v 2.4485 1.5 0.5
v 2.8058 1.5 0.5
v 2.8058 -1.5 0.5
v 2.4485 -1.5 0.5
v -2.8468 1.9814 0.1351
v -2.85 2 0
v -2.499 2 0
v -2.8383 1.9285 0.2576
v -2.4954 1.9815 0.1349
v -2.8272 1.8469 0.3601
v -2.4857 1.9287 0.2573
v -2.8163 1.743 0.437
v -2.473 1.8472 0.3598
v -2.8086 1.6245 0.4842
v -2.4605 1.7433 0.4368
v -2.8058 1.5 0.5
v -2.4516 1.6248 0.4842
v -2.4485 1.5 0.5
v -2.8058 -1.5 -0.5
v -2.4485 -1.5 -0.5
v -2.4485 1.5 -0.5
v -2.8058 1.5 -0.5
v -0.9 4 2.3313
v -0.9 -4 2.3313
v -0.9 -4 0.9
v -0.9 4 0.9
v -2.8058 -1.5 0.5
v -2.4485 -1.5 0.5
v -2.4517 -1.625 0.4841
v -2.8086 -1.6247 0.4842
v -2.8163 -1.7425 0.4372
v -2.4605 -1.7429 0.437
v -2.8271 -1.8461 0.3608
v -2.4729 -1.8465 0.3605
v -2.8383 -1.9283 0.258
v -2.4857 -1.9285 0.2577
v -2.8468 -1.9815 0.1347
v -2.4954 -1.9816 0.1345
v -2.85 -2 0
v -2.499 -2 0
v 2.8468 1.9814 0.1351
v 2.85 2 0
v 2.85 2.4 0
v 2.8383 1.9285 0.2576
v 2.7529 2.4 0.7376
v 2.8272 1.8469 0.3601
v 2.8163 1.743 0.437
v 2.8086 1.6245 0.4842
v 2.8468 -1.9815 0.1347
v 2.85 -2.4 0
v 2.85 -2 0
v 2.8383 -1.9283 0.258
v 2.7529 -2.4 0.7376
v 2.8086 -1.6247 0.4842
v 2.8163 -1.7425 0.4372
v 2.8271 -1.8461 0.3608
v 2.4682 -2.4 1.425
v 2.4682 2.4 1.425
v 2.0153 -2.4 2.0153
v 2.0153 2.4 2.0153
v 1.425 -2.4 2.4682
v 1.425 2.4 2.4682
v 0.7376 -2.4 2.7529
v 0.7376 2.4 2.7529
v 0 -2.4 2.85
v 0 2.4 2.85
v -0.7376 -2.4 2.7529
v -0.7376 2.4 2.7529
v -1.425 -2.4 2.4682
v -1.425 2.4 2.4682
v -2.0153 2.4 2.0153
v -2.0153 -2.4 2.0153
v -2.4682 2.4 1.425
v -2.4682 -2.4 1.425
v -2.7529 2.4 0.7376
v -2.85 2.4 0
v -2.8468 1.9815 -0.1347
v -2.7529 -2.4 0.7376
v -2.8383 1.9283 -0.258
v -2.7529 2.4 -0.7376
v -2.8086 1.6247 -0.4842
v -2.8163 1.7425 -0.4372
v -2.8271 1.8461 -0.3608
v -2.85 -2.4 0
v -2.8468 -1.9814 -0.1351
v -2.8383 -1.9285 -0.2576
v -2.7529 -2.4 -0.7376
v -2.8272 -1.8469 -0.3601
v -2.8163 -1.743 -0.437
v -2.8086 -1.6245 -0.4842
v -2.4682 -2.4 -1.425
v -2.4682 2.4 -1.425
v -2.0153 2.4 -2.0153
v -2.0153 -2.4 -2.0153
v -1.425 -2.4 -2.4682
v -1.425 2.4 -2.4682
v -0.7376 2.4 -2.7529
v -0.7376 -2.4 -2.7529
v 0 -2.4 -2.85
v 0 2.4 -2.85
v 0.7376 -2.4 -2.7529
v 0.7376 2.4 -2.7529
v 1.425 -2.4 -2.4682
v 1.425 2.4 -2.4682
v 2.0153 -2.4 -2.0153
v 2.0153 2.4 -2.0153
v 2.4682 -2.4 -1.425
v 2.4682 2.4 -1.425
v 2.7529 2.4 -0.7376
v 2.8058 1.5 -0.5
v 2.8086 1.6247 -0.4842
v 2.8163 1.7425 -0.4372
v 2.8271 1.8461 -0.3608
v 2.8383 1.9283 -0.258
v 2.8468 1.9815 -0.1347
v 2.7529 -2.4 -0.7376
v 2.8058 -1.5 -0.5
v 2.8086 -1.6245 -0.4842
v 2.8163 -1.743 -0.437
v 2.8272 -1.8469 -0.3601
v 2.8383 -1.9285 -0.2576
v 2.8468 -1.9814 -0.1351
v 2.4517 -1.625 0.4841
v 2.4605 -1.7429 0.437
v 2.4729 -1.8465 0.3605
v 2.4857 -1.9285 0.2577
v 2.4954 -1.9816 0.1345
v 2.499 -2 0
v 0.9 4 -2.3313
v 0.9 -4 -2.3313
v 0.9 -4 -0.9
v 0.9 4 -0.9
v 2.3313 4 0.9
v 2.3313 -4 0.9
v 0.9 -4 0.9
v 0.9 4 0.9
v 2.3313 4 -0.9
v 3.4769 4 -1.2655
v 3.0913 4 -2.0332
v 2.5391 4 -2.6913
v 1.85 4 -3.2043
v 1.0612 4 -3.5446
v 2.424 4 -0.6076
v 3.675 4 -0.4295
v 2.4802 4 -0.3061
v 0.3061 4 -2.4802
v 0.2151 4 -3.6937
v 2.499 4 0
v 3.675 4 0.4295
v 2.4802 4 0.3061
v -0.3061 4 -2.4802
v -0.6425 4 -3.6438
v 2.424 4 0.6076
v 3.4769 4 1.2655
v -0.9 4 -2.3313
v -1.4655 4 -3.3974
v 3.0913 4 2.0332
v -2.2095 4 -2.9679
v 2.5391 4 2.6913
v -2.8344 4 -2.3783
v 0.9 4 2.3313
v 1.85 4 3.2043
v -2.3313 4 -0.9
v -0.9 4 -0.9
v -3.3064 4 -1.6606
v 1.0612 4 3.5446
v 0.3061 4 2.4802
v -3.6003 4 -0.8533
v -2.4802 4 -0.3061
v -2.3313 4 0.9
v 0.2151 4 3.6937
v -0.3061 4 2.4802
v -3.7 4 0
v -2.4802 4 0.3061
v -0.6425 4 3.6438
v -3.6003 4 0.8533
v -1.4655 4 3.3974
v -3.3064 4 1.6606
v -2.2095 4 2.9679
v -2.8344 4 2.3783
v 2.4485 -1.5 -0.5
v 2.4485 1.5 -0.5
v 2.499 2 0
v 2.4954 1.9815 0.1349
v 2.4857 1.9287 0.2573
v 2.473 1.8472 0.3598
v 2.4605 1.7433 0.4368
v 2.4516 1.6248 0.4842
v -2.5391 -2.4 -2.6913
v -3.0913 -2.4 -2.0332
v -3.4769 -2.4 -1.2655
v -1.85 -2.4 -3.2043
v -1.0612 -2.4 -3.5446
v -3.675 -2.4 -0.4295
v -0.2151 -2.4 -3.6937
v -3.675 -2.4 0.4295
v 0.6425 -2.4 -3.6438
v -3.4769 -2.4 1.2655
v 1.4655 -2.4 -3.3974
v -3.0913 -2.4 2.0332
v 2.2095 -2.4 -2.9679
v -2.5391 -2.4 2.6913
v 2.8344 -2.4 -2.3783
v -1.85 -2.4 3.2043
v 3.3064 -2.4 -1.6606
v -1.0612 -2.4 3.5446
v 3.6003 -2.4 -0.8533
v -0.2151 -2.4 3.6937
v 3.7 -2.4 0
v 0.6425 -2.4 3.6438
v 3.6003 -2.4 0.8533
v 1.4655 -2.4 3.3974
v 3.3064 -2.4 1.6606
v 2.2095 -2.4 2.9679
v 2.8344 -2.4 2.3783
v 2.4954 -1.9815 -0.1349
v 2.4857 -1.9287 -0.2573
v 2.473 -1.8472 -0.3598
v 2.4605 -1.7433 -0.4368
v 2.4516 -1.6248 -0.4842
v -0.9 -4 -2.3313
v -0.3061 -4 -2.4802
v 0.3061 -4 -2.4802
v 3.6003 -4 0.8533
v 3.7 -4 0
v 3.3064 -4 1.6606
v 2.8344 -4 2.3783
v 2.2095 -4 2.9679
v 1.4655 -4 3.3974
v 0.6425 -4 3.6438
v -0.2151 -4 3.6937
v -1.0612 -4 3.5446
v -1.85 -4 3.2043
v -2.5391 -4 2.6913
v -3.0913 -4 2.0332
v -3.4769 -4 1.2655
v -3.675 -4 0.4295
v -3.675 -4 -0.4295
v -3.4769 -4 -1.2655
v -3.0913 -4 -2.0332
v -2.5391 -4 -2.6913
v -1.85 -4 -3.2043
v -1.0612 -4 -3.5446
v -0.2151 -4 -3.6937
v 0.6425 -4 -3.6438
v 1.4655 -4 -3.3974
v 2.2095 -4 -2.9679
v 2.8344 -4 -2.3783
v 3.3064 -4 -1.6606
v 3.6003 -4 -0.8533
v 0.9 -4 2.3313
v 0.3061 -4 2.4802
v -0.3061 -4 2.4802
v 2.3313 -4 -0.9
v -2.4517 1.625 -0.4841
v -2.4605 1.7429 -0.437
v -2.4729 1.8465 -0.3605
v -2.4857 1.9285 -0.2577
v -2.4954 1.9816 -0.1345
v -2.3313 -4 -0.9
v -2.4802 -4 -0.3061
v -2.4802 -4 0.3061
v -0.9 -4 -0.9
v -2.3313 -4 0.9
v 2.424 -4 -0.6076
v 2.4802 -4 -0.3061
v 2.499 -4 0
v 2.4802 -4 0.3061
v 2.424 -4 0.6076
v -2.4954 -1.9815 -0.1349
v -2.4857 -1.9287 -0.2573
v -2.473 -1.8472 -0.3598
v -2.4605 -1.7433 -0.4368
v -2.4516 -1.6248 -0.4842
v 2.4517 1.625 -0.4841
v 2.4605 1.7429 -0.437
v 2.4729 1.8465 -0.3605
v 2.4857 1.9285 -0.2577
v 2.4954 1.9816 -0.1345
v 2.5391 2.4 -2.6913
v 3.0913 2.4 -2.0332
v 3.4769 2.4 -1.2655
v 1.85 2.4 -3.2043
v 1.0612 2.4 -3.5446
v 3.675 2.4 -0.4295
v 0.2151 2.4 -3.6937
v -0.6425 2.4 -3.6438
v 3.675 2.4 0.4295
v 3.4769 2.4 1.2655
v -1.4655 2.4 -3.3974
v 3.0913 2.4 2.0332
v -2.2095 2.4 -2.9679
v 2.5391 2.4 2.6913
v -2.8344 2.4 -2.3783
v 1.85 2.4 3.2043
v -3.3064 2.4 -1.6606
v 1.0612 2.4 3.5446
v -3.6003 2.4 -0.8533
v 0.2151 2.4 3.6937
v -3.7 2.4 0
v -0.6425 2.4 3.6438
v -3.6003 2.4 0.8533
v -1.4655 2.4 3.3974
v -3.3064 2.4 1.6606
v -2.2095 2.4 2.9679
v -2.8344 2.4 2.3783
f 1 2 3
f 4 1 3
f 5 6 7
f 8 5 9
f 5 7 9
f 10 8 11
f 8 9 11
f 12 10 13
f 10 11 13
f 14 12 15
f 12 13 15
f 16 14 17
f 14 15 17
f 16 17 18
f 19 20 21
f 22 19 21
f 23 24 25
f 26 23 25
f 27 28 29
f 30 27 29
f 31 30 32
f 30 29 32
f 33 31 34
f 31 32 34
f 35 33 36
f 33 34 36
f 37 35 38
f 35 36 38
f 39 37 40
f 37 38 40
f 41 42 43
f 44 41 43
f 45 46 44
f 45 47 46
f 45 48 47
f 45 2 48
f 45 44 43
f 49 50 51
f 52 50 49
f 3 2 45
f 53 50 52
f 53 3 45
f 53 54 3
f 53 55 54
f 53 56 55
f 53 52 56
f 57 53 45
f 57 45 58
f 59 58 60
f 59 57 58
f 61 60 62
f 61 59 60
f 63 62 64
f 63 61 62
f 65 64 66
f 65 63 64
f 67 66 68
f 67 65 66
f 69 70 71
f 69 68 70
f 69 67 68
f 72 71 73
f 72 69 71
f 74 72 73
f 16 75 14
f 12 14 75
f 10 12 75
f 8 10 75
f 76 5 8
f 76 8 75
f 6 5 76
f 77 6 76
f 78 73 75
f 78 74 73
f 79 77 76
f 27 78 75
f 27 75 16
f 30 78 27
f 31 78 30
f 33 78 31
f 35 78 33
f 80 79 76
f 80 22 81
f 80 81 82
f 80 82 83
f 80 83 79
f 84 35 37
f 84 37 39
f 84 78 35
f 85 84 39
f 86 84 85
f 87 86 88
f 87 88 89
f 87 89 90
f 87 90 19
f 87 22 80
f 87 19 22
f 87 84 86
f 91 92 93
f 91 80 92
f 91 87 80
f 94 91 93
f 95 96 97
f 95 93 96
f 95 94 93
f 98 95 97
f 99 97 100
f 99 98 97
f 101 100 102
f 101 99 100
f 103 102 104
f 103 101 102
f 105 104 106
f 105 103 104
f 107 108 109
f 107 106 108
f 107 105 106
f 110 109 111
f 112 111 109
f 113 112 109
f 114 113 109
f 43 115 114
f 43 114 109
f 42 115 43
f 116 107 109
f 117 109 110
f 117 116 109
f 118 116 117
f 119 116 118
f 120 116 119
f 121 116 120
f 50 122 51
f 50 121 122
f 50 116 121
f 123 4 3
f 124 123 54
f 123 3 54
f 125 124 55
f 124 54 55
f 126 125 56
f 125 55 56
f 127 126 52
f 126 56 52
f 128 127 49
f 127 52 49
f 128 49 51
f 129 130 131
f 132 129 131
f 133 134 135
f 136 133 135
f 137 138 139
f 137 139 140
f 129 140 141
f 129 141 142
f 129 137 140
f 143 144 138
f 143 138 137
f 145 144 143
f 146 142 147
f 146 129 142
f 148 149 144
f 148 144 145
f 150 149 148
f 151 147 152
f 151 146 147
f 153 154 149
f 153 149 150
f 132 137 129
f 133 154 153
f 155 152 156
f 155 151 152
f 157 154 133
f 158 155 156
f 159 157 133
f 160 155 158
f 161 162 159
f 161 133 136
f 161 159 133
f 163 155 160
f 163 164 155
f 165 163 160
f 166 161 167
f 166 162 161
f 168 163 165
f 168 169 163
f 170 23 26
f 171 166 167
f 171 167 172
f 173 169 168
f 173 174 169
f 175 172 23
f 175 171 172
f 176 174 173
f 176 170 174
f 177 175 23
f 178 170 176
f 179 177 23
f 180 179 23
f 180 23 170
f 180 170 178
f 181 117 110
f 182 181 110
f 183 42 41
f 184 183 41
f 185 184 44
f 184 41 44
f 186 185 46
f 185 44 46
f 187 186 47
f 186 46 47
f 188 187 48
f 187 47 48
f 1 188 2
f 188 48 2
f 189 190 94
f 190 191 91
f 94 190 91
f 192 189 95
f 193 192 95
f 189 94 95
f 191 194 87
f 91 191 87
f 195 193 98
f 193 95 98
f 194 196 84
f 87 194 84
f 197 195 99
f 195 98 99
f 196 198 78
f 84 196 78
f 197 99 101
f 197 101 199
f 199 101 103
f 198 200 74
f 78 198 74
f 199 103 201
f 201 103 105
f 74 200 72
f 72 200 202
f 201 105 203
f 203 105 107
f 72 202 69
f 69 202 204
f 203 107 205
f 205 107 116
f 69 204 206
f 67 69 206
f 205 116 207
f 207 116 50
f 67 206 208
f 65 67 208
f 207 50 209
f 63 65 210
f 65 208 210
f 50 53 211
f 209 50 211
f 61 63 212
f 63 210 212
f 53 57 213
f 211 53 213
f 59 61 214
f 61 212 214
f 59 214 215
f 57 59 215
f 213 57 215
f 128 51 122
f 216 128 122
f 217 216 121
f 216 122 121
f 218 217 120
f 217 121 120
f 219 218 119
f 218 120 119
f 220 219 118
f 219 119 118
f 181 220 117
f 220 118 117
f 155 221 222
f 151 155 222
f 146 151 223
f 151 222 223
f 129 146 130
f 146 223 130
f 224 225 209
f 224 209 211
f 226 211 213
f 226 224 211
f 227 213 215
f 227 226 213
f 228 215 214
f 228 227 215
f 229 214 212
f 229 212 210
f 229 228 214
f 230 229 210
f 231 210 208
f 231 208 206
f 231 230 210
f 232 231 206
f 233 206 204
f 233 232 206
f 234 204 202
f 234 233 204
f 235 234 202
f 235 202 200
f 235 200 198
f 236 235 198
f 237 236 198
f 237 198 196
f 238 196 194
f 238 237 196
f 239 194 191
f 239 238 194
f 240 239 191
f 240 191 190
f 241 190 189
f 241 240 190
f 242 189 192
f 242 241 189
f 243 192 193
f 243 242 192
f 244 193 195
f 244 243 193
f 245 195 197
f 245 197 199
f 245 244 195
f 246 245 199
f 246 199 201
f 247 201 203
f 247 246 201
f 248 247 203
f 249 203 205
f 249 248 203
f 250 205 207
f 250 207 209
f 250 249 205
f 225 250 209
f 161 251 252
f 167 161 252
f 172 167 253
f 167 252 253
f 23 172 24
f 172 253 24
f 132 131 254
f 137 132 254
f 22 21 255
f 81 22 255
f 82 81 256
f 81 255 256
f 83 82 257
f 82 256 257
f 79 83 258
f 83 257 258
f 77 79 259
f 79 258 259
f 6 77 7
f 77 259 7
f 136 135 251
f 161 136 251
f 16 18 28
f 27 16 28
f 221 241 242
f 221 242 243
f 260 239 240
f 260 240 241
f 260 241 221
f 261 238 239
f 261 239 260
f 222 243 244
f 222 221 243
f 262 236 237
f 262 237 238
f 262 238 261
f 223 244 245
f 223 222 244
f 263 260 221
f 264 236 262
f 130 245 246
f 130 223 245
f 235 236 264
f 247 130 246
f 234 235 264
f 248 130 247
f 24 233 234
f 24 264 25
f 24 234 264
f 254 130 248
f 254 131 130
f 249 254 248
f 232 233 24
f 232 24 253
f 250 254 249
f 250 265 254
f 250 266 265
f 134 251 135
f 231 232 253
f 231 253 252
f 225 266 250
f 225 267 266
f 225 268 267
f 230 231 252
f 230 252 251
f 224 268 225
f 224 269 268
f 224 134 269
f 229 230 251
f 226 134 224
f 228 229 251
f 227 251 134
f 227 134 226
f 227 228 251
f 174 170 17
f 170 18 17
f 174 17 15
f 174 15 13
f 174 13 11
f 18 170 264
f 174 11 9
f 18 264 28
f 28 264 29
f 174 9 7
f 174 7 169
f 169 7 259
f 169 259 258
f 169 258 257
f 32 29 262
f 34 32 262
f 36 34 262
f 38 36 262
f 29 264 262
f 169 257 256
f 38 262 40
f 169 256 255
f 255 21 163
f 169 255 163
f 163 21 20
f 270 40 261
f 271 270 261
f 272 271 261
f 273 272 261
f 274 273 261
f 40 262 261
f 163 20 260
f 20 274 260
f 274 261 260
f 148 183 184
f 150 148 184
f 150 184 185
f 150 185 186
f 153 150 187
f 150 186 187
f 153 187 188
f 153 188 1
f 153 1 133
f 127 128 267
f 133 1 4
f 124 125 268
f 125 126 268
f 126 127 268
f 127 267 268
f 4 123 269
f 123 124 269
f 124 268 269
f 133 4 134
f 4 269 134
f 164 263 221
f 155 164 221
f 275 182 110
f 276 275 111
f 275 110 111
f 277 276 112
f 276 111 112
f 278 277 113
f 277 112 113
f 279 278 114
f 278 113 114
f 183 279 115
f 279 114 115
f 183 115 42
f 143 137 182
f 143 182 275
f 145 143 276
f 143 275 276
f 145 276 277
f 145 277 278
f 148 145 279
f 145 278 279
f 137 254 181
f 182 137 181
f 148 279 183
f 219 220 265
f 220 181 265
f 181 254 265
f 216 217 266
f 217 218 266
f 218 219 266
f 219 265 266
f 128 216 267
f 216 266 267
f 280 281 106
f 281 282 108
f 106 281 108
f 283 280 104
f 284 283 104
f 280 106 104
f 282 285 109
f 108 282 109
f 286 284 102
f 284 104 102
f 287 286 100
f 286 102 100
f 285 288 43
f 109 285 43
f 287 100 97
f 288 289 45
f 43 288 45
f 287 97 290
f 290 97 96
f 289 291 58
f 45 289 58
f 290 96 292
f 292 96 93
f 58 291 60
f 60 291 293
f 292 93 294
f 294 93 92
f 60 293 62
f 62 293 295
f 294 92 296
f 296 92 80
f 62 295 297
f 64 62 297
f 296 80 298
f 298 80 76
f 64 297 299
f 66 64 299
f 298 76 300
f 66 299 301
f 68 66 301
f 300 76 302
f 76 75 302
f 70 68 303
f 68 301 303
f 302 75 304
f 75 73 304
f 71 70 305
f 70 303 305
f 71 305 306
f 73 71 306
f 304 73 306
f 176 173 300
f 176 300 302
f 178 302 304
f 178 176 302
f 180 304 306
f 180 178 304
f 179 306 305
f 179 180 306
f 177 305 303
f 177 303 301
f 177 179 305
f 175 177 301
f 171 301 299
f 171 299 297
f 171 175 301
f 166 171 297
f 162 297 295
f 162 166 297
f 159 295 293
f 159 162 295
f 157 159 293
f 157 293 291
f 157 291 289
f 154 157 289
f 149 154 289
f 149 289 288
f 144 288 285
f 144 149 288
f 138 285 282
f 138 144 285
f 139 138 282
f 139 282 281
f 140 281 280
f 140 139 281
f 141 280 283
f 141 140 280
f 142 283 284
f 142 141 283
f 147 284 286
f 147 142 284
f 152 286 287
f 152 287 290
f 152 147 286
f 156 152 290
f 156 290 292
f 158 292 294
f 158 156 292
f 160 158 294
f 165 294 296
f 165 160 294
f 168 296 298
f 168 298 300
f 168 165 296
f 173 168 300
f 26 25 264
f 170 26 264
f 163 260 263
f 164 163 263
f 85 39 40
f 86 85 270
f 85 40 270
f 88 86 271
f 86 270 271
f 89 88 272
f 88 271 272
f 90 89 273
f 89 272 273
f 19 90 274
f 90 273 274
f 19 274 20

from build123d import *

# Parameters (mm, degrees)
F0_R     = 2.85
F1_DEPTH = 4
F2_R     = 3.7
F2_R_2   = 2.85
F3_DEPTH = 1.6
F4_R     = 3.7
F4_R_2   = 2.85
F5_DEPTH = 1.6
F7_DEPTH = 8.001
F9_DEPTH = 12.5


with BuildPart() as f1:
    # F0 (on Front) → F1 (new body, symmetric)
    with BuildSketch(Plane.XZ):
        Circle(F0_R)
    extrude(amount=F1_DEPTH, both=True)

    # F2 (on face) → F3 (join)
    with BuildSketch(Plane.XZ.offset(4)):
        Circle(F2_R)
        Circle(F2_R_2, mode=Mode.SUBTRACT)
    extrude(amount=-F3_DEPTH)

    # F4 (on face) → F5 (join)
    with BuildSketch(Plane(origin=(0, 4, 0), x_dir=(-1, 0, 0), z_dir=(0, 1, 0))):
        Circle(F4_R)
        Circle(F4_R_2, mode=Mode.SUBTRACT)
    extrude(amount=-F5_DEPTH)

    # F6 (on face) → F7 (cut, through all)
    with BuildSketch(Plane.XZ.offset(4)):
        with BuildLine():
            ThreePointArc((2.331309, -0.9), (2.45672, -0.457745), (2.499, 0))
            ThreePointArc((2.499, 0), (2.45672, 0.457745), (2.331309, 0.9))
            Line((2.331309, 0.9), (0.9, 0.9))
            Line((0.9, 0.9), (0.9, 2.331309))
            ThreePointArc((0.9, 2.331309), (0, 2.499), (-0.9, 2.331309))
            Line((-0.9, 2.331309), (-0.9, 0.9))
            Line((-0.9, 0.9), (-2.331309, 0.9))
            ThreePointArc((-2.331309, 0.9), (-2.499, 0), (-2.331309, -0.9))
            Line((-2.331309, -0.9), (-0.9, -0.9))
            Line((-0.9, -0.9), (-0.9, -2.331309))
            ThreePointArc((-0.9, -2.331309), (0, -2.499), (0.9, -2.331309))
            Line((0.9, -2.331309), (0.9, -0.9))
            Line((0.9, -0.9), (2.331309, -0.9))
        make_face()
    extrude(amount=-F7_DEPTH, mode=Mode.SUBTRACT)

    # F8 (on Right) → F9 (cut, symmetric)
    with BuildSketch(Plane.YZ):
        with BuildLine():
            Line((1.5, 0), (0, 0))
            Line((0, 0), (-1.5, 0))
            Line((-1.5, 0), (-2, 0))
            ThreePointArc((-2, 0), (-1.853553, -0.353553), (-1.5, -0.5))
            Line((-1.5, -0.5), (1.5, -0.5))
            ThreePointArc((1.5, -0.5), (1.853553, -0.353553), (2, 0))
            Line((2, 0), (1.5, 0))
        make_face()
        with BuildLine():
            Line((0, 0.5), (0, 0))
            Line((0, 0), (1.5, 0))
            Line((1.5, 0), (2, 0))
            ThreePointArc((2, 0), (1.853553, 0.353553), (1.5, 0.5))
            Line((1.5, 0.5), (0, 0.5))
        make_face()
        with BuildLine():
            Line((-1.5, 0), (0, 0))
            Line((0, 0), (0, 0.5))
            Line((0, 0.5), (-1.5, 0.5))
            ThreePointArc((-1.5, 0.5), (-1.853553, 0.353553), (-2, 0))
            Line((-2, 0), (-1.5, 0))
        make_face()
    extrude(amount=F9_DEPTH, both=True, mode=Mode.SUBTRACT)


solid = f1.part
